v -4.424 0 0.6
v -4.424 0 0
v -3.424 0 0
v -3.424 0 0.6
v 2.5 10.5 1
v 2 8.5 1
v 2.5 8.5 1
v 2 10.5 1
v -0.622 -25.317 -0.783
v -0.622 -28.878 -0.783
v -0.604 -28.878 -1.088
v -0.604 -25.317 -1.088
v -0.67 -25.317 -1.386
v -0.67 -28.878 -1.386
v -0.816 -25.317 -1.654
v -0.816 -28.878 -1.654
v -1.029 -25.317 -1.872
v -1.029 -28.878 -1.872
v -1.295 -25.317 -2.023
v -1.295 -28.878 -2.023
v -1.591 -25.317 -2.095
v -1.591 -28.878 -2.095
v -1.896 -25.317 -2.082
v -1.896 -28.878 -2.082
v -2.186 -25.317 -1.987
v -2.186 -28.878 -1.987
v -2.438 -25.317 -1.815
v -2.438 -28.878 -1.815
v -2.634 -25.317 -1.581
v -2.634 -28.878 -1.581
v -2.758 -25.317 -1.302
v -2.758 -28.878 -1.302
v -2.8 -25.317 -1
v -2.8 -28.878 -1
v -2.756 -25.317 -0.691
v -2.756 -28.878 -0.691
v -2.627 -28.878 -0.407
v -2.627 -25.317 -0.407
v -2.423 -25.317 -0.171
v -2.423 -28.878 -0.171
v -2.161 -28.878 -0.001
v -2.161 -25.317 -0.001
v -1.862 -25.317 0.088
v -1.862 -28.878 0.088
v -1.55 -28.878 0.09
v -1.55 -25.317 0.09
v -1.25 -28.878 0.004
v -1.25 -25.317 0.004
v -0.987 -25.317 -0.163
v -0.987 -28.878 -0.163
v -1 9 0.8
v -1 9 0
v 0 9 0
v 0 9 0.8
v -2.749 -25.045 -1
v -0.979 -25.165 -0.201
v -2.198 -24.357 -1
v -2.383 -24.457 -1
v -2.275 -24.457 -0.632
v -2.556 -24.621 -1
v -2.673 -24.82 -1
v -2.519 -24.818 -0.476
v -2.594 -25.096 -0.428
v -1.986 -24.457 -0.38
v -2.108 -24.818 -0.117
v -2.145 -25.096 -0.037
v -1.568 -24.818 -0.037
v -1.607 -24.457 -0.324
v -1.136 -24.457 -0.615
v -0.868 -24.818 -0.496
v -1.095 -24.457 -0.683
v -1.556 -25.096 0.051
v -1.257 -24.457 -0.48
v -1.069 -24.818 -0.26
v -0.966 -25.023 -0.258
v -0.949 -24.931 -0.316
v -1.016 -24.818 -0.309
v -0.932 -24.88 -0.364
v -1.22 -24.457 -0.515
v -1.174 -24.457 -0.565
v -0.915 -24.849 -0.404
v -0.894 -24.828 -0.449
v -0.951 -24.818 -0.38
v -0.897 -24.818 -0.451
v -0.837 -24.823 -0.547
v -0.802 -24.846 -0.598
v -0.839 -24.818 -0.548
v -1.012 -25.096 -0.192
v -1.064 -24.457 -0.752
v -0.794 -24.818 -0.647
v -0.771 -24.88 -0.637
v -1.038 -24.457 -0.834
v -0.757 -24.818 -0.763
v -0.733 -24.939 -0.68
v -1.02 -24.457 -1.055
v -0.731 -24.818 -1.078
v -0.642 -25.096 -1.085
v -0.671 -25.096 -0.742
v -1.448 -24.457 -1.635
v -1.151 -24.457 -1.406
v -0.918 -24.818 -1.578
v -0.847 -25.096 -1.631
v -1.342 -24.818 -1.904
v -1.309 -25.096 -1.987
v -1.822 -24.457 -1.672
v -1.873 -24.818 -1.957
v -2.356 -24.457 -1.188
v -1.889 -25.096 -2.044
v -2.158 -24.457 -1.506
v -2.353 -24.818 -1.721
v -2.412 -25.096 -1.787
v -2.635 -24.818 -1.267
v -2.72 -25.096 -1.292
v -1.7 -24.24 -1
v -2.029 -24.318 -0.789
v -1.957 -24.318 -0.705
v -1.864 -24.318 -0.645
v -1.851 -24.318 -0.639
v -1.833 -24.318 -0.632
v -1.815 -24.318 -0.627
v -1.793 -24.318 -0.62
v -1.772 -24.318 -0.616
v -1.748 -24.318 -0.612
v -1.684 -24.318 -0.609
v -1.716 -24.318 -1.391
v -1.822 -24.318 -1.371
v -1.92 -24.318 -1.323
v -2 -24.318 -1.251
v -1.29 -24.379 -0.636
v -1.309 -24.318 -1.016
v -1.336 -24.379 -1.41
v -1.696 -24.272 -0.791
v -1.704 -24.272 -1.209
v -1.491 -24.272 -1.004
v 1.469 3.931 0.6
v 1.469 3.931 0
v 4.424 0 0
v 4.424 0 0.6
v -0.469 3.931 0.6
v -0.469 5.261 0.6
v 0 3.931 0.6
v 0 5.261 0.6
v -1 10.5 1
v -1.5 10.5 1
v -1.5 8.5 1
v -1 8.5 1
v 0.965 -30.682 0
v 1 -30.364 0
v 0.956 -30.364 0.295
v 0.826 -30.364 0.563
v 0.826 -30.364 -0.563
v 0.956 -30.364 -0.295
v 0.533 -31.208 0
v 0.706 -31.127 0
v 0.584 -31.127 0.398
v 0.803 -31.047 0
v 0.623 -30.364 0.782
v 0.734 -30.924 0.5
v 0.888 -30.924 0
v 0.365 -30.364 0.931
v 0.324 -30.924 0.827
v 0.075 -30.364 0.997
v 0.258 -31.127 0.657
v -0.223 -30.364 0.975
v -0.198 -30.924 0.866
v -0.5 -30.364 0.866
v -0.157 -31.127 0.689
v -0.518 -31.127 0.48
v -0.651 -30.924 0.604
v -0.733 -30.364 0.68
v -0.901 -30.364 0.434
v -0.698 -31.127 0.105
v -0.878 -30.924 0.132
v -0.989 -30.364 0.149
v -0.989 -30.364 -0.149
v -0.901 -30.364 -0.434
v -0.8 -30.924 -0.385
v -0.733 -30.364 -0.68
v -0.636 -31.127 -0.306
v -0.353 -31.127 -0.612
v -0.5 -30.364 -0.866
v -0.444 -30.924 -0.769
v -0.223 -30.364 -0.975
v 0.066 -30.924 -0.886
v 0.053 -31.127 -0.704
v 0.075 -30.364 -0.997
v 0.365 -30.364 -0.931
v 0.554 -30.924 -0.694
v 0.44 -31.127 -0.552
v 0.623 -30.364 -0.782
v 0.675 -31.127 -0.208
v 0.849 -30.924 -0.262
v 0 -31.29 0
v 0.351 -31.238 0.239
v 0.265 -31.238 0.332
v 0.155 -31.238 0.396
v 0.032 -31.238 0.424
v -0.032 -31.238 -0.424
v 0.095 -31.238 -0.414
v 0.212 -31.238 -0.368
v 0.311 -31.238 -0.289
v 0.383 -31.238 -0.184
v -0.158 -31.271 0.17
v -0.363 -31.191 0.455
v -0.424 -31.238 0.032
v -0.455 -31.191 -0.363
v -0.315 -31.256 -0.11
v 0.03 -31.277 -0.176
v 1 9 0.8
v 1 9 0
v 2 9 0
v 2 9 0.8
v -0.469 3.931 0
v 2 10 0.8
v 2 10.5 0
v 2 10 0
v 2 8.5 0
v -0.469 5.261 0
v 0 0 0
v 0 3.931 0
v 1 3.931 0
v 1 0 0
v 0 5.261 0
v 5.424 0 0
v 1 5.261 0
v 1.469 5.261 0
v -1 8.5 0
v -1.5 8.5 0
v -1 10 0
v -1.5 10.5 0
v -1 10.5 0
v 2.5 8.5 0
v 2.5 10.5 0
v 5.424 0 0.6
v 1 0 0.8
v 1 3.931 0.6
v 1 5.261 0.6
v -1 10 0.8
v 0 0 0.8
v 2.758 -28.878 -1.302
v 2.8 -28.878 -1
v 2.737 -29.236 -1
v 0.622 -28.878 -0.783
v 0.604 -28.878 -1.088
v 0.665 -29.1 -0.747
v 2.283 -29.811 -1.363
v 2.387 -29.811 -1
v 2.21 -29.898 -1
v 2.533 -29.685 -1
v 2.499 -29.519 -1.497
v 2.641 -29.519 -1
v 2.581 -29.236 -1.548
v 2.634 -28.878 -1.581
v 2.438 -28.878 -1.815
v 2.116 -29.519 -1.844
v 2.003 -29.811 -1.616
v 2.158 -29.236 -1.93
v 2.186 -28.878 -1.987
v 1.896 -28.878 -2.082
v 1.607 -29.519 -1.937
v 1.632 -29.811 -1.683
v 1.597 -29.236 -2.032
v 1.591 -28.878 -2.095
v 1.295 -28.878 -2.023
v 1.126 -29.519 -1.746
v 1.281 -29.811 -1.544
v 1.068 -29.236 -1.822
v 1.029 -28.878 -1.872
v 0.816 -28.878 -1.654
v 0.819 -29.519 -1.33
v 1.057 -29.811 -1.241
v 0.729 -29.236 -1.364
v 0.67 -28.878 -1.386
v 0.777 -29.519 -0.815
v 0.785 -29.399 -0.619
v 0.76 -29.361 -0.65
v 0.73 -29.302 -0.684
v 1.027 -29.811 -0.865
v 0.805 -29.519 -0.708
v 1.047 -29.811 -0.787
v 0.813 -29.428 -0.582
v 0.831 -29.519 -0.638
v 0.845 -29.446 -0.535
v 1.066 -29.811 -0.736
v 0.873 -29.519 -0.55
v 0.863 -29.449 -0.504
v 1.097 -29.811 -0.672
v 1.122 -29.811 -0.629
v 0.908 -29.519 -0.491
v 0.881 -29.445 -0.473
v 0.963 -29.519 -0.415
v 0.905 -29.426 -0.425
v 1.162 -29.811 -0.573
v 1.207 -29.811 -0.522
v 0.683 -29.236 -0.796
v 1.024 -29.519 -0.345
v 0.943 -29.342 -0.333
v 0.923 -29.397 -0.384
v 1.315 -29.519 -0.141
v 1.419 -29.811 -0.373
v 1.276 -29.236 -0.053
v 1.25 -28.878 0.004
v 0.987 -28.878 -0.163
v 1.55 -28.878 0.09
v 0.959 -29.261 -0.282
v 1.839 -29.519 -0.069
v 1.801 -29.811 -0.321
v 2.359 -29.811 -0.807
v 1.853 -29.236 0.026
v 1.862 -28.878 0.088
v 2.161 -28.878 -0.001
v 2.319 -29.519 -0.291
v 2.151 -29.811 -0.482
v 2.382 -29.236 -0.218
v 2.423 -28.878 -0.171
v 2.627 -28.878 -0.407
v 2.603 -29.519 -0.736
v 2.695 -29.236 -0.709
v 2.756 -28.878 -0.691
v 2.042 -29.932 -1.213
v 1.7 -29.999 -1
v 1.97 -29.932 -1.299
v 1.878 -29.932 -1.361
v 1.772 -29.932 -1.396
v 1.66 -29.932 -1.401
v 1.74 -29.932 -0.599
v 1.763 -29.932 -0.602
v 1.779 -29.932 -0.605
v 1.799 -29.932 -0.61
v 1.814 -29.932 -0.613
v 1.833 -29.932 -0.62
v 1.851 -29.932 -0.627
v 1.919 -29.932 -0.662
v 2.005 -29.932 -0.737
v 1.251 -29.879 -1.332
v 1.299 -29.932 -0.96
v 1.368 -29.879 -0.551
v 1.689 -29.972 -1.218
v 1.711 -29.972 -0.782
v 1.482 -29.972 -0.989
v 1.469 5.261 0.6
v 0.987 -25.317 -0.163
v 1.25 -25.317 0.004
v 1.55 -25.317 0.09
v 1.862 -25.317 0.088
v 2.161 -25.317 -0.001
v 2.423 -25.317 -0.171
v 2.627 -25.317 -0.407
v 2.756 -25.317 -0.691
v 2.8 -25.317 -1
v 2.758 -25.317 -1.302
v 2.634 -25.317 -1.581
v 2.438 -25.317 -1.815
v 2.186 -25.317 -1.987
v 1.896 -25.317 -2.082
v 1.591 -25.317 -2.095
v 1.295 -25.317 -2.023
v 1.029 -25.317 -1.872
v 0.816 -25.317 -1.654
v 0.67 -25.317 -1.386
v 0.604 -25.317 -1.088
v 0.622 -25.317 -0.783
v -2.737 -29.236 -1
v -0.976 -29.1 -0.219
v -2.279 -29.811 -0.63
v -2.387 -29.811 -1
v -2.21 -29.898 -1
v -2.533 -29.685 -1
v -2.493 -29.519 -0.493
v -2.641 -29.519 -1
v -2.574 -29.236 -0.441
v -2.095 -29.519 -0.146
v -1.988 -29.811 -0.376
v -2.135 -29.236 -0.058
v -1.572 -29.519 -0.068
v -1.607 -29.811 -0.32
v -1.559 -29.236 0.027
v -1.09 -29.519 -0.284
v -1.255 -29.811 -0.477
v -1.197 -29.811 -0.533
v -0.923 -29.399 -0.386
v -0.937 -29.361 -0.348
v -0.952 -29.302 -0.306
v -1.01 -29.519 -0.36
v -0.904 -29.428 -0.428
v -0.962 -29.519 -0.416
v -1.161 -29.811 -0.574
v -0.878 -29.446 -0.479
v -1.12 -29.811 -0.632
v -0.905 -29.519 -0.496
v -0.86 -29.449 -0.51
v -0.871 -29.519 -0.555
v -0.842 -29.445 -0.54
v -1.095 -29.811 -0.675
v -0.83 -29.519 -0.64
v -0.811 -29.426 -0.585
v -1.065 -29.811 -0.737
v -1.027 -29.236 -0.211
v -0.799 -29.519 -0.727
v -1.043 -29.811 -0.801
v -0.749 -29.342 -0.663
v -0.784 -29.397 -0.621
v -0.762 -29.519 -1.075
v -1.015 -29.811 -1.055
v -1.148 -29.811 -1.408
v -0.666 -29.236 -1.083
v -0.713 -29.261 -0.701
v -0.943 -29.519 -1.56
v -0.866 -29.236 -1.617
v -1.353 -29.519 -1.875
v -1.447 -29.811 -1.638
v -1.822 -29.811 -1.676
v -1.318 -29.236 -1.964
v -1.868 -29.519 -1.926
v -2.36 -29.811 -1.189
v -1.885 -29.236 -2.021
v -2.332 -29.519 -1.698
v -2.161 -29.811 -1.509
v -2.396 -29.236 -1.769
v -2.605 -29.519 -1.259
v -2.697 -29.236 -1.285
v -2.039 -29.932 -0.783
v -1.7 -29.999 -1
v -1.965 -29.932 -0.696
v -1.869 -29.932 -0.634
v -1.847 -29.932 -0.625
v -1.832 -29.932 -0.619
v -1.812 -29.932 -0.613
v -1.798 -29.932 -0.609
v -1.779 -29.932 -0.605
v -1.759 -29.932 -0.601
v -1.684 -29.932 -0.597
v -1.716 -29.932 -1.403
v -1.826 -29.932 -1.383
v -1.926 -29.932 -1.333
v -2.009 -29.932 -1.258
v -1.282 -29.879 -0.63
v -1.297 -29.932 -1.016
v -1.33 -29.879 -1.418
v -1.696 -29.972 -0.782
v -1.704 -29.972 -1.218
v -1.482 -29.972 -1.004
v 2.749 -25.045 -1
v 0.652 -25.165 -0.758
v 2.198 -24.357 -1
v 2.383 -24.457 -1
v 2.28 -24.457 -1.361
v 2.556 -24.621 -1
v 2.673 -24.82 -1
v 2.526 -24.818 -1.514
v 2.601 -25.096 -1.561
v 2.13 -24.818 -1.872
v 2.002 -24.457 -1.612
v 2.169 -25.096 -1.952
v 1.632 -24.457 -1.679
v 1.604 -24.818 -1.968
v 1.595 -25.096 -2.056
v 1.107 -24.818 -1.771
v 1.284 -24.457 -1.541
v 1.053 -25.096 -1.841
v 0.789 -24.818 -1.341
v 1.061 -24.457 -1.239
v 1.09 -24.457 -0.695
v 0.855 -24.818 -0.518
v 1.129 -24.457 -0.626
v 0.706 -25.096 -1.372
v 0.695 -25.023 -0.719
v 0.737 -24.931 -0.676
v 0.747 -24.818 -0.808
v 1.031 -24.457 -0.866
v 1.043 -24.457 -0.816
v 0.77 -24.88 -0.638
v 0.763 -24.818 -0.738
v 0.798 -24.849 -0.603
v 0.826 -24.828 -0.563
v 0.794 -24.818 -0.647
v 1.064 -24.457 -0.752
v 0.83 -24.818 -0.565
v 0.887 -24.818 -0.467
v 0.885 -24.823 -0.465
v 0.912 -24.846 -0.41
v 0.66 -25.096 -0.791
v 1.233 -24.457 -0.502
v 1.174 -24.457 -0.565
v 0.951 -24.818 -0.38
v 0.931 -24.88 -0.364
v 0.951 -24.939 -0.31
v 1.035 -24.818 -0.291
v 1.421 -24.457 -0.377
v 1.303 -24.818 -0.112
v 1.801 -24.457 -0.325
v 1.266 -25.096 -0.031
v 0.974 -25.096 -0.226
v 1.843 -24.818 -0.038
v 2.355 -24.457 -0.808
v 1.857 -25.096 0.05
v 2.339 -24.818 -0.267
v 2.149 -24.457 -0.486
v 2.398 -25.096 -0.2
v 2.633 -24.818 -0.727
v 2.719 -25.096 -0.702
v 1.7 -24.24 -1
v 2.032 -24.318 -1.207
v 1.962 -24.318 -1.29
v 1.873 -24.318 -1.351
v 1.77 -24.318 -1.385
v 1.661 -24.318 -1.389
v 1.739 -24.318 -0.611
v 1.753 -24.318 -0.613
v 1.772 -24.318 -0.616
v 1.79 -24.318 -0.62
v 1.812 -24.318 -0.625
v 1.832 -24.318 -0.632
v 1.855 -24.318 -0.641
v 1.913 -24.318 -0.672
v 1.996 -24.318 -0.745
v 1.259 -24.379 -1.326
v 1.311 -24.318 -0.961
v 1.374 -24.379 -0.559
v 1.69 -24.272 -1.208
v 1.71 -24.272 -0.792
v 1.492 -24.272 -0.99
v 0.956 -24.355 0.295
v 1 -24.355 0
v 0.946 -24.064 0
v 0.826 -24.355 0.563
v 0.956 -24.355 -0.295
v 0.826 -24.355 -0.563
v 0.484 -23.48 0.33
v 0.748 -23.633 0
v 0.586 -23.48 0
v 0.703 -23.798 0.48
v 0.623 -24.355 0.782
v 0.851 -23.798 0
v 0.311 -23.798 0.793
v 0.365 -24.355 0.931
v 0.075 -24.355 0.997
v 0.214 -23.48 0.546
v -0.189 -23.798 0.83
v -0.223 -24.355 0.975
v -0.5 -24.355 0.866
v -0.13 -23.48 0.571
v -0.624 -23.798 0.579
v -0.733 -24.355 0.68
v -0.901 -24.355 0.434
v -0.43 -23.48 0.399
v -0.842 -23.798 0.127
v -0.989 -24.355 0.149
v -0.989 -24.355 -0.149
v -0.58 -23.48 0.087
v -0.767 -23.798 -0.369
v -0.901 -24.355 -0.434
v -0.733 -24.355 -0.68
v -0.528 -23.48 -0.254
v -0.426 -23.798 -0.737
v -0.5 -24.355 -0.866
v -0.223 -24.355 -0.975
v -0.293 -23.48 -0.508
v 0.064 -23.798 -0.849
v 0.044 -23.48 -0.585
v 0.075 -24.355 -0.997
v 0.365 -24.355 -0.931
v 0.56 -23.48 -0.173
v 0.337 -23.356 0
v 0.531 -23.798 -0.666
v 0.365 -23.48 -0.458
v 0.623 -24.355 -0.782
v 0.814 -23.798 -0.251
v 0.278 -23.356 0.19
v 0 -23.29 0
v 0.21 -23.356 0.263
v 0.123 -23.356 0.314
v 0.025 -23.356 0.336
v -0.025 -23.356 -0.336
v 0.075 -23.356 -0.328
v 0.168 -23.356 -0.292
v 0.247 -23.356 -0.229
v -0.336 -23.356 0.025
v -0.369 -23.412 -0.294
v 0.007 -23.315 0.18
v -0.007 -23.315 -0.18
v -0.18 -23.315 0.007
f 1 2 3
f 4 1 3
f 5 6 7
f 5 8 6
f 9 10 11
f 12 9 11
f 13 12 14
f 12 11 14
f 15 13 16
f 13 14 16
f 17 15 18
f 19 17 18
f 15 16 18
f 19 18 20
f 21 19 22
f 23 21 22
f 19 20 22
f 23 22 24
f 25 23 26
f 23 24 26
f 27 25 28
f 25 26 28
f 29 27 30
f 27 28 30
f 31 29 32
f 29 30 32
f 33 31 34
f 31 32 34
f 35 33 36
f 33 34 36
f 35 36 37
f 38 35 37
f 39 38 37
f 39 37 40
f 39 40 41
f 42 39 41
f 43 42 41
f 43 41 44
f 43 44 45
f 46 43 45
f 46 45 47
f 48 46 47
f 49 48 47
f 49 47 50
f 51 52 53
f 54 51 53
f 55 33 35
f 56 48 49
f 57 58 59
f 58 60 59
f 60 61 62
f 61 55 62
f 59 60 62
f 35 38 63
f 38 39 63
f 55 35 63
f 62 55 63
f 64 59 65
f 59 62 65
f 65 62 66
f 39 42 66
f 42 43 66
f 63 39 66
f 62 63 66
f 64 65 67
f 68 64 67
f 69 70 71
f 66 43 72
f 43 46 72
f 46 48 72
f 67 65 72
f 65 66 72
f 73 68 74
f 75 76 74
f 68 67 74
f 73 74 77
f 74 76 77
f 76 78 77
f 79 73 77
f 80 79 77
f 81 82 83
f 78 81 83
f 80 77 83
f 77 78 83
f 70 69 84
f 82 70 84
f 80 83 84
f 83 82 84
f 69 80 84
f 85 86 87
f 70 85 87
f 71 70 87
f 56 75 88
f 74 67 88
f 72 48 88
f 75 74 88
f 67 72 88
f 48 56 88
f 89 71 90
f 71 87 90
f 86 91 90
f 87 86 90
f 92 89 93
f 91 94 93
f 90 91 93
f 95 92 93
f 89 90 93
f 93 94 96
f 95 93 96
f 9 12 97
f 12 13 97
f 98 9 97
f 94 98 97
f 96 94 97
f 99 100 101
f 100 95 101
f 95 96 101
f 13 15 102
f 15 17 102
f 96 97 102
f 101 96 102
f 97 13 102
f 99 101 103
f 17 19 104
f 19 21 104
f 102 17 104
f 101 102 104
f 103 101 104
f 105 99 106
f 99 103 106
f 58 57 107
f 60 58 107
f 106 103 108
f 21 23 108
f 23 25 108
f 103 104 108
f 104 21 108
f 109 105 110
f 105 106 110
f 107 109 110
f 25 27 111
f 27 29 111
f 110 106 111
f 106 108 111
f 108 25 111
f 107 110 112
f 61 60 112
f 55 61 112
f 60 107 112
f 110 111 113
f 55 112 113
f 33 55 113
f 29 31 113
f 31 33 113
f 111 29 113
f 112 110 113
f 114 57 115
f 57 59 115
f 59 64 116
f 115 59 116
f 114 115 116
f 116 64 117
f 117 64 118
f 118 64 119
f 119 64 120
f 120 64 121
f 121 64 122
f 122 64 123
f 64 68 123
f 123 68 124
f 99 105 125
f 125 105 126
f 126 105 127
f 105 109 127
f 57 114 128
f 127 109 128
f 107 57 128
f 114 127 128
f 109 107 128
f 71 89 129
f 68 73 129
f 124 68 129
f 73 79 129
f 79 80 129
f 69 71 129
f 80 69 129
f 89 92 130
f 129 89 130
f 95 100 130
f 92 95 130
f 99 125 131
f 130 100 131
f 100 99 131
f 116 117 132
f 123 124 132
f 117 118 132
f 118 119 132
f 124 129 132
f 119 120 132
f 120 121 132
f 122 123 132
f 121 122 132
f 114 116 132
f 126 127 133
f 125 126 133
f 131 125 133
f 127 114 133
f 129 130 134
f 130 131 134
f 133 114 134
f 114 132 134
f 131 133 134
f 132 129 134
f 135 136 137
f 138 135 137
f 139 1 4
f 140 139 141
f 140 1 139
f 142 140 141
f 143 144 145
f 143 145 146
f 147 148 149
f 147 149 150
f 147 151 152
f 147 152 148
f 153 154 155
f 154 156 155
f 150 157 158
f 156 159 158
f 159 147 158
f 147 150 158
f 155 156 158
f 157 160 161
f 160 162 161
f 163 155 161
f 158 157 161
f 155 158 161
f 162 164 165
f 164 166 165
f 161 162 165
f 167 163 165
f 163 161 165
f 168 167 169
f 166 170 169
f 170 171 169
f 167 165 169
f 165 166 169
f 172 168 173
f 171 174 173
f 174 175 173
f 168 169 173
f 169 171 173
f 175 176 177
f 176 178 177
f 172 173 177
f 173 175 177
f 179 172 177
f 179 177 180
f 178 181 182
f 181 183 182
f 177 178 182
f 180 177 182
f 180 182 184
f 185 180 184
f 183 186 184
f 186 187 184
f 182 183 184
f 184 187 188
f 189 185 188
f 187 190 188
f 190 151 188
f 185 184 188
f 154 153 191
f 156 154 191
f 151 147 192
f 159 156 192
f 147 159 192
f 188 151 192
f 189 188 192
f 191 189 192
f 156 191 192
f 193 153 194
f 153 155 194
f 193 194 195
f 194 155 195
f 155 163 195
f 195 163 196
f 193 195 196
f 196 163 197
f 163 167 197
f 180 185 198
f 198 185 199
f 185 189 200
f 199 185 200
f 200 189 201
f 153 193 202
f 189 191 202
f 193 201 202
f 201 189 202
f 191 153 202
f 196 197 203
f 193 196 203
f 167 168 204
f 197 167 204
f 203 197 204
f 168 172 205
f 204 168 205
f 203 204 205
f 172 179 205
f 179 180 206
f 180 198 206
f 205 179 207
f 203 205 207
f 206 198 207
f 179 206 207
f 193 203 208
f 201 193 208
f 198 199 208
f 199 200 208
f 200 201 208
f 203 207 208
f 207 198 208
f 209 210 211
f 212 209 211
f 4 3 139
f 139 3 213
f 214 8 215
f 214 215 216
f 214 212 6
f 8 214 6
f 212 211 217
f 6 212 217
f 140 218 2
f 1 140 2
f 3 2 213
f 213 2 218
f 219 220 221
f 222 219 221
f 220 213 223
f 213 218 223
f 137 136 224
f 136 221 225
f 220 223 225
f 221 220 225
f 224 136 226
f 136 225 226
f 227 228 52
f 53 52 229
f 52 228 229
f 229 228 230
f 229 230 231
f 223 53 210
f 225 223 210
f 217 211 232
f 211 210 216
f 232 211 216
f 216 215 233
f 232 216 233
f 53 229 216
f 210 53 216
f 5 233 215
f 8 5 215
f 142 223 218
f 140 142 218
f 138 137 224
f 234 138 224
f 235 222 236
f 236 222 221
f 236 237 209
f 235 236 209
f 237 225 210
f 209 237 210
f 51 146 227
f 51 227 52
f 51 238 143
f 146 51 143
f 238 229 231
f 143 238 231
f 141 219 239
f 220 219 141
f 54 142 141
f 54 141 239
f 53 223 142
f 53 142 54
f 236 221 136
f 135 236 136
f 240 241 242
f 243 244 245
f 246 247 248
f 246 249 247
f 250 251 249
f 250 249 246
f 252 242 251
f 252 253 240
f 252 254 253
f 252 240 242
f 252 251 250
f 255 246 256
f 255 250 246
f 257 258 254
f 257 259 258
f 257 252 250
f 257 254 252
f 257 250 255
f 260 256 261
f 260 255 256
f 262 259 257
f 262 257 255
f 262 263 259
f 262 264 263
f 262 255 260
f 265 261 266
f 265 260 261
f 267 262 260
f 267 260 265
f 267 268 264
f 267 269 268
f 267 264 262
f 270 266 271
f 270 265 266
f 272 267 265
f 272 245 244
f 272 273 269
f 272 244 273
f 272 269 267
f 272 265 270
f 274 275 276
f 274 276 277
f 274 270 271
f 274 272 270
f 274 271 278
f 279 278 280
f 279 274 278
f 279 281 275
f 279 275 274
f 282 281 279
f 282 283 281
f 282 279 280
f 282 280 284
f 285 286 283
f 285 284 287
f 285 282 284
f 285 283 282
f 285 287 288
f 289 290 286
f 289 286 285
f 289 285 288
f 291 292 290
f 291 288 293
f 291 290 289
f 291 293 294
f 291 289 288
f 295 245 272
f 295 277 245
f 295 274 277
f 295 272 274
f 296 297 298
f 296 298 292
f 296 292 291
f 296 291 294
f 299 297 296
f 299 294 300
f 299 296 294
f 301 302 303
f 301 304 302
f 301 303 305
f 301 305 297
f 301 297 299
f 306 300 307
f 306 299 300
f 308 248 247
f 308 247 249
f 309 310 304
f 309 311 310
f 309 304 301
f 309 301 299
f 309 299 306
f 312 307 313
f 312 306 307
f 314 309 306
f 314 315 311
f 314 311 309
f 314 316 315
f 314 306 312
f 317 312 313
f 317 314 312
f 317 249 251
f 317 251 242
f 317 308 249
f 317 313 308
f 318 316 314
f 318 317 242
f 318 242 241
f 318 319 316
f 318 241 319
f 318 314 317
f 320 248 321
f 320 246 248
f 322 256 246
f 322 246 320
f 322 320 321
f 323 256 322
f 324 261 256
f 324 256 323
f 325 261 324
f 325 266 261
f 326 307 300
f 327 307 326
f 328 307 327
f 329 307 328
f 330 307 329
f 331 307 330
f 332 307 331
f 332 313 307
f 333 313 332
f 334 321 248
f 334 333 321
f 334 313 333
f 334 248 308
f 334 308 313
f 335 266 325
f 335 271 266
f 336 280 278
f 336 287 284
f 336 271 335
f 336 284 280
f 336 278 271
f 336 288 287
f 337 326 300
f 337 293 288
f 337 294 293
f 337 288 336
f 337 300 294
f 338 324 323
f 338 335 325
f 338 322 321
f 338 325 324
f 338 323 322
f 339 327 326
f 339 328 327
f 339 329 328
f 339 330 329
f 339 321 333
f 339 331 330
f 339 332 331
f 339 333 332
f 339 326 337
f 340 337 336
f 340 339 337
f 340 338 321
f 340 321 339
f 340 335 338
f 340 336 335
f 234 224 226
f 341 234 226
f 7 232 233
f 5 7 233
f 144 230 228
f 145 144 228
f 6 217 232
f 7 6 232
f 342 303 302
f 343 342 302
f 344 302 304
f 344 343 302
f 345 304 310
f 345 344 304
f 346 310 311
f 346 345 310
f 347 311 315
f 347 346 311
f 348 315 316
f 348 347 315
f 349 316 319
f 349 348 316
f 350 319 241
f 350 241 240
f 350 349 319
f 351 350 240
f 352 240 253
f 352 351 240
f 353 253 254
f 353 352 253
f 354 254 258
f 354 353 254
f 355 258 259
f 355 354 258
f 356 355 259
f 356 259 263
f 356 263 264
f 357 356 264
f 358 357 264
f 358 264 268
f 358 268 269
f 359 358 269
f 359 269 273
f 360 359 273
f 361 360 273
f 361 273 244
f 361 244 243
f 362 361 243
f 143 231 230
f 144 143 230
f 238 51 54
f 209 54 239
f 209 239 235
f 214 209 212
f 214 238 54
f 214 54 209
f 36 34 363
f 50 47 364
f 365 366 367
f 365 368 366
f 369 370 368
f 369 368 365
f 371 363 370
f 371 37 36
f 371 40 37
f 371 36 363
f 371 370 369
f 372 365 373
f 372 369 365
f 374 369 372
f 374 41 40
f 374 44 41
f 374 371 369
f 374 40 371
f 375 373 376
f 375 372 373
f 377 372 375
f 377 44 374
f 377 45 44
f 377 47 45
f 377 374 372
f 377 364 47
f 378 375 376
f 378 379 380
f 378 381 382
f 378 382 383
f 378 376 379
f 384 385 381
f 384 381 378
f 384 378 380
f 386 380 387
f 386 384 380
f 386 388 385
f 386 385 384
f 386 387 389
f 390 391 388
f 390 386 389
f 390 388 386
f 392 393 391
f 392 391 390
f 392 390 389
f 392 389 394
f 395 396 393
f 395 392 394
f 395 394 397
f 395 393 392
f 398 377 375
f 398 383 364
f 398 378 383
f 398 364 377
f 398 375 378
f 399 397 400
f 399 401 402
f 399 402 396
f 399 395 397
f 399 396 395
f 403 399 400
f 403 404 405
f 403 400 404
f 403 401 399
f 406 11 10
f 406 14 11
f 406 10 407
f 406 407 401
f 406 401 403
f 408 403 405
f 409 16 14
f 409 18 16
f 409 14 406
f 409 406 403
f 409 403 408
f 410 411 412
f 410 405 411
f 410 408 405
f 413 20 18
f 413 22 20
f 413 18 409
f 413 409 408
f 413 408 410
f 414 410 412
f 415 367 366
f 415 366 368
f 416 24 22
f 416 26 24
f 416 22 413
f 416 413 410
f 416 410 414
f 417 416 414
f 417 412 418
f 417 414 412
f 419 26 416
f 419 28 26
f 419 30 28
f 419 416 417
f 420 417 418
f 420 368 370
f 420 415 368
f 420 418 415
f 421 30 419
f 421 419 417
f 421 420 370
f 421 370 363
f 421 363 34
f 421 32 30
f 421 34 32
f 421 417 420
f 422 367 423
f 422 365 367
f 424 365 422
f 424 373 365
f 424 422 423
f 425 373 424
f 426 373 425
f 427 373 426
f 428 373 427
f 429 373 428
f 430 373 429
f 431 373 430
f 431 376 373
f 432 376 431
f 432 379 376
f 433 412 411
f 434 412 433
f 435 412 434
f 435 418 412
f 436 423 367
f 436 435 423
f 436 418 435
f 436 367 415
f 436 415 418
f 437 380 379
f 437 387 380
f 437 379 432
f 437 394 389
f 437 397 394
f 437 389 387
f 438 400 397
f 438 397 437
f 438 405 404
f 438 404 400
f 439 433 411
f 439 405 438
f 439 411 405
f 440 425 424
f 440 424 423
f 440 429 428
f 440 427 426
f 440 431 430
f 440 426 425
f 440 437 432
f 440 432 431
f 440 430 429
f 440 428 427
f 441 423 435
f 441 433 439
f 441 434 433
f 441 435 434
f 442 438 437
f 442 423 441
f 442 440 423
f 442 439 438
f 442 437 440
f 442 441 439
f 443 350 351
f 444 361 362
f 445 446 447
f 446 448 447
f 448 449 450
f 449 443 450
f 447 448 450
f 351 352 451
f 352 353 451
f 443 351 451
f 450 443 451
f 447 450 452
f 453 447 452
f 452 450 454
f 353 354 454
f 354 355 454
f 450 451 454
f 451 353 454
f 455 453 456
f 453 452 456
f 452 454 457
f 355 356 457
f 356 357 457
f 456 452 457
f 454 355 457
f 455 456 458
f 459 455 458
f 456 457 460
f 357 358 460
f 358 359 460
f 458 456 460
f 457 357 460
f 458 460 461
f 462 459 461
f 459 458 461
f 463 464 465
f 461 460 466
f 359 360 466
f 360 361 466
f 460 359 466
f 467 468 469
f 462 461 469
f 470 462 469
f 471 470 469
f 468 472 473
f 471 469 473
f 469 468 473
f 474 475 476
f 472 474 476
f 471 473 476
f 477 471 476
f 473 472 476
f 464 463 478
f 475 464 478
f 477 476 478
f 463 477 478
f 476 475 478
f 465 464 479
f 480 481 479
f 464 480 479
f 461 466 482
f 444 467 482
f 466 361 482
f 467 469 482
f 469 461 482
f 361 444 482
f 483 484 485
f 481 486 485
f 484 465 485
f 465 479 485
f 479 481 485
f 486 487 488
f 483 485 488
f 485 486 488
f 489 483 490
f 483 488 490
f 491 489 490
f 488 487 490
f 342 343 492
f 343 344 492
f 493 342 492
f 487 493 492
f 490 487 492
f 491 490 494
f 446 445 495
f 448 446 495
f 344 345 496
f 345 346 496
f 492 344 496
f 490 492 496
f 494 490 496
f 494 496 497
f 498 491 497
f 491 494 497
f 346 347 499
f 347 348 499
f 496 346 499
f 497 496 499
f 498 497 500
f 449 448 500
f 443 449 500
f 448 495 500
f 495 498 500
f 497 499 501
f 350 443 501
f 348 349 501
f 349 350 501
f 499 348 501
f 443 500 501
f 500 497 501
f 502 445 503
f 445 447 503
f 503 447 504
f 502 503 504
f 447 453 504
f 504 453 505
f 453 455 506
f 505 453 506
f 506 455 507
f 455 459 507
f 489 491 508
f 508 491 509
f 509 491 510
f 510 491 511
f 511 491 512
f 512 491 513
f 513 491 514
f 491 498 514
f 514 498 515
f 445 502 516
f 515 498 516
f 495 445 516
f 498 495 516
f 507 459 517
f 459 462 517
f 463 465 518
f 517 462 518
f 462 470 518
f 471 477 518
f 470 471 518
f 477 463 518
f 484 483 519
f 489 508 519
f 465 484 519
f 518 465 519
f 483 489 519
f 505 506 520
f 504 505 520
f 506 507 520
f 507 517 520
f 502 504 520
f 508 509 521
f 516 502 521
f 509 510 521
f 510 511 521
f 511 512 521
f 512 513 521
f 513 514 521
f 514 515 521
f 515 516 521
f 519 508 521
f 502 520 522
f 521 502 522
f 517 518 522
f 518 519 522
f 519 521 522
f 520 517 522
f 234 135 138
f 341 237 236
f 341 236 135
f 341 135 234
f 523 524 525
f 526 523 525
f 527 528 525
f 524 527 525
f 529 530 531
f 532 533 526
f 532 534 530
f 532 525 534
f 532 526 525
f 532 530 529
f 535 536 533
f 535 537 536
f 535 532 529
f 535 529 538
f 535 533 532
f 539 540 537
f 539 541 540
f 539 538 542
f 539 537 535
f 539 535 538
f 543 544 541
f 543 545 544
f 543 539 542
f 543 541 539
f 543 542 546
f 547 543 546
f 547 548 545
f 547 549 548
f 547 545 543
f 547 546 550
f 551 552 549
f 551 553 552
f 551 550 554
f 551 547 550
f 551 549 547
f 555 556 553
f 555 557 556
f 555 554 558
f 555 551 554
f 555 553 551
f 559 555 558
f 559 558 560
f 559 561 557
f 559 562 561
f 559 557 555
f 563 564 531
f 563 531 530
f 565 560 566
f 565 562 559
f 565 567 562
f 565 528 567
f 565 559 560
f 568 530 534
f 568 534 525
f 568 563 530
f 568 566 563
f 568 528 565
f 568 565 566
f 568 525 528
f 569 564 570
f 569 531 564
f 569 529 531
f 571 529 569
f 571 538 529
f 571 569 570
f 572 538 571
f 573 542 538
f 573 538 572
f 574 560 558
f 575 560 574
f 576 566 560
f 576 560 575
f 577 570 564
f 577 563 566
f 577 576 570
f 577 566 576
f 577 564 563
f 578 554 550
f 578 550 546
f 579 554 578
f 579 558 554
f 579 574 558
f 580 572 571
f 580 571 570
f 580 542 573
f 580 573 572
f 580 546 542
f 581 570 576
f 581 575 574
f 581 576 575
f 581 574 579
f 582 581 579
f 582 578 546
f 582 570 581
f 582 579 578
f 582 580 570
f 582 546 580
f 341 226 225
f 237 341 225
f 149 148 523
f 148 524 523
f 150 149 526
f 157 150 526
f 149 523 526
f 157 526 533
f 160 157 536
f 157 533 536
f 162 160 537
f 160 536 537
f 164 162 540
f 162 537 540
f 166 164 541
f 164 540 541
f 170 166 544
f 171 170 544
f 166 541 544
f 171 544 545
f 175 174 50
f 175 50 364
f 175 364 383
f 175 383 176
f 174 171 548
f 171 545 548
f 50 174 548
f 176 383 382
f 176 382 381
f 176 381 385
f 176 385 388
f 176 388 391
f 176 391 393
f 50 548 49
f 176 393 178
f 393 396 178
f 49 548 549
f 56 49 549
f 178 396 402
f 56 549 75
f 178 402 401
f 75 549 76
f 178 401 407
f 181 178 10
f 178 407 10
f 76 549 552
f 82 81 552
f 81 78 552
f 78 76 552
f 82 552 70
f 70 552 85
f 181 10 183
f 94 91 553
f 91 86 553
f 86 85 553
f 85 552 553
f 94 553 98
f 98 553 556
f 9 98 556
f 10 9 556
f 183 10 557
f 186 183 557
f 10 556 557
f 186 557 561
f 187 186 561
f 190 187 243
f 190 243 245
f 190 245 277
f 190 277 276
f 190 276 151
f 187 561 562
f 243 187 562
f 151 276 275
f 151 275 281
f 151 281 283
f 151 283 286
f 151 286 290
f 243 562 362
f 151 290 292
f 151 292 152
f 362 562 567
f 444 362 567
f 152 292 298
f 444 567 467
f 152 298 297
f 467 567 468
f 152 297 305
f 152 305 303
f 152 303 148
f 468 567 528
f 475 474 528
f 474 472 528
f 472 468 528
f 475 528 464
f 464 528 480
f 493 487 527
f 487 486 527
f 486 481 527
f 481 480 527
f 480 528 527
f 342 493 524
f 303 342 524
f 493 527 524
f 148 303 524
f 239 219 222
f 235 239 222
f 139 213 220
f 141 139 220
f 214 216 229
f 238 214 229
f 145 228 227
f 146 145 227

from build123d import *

# Parameters (mm, degrees)
F0_W     = 1
F0_H     = 9
F0_H_2   = 1
F1_DEPTH = 0.8
F2_DEPTH = 1
F4_DEPTH = 0.6


with BuildPart() as f1:
    # F0 (on Top) → F1 (new body)
    with BuildSketch(Plane.XY):
        with Locations((0.5, 4.5)):
            Rectangle(F0_W, F0_H)
        with Locations((-0.5, 9.5)):
            Rectangle(F0_W, F0_H_2)
        with Locations((0.5, 9.5)):
            Rectangle(F0_W, F0_H_2)
        with Locations((1.5, 9.5)):
            Rectangle(F0_W, F0_H_2)
        Polygon((-1, 8.5), (-1, 9), (-1, 10), (-1, 10.5), (-1.5, 10.5), (-1.5, 8.5), align=None)
        Polygon((2, 10), (2, 9), (2, 8.5), (2.5, 8.5), (2.5, 10.5), (2, 10.5), align=None)
    extrude(amount=F1_DEPTH)

    # F0 (on Top) → F2 (join)
    with BuildSketch(Plane.XY):
        Polygon((2, 10), (2, 9), (2, 8.5), (2.5, 8.5), (2.5, 10.5), (2, 10.5), align=None)
        Polygon((-1, 8.5), (-1, 9), (-1, 10), (-1, 10.5), (-1.5, 10.5), (-1.5, 8.5), align=None)
    extrude(amount=F2_DEPTH)

    # F3 (on Top) → F4 (join)
    with BuildSketch(Plane.XY):
        Polygon((1.468523, 5.261297), (0.5, 5.261297), (-0.468523, 5.261297), (-4.423744, 0), (-3.423744, 0), (-0.468523, 3.931081), (0.5, 3.931081), (1.468523, 3.931081), (4.423744, 0), (5.423744, 0), align=None)
    extrude(amount=F4_DEPTH)


with BuildPart() as f6:
    # F5 (on Top) → F6 (revolve)
    with BuildSketch(Plane.XY):
        with BuildLine():
            add(Edge.make_bspline(
                [(0, -23.29011), (0.771088, -23.357442), (0.928936, -23.834245), (1, -24.355026)],
                knots=[0, 0, 0, 0, 1.460837, 1.460837, 1.460837, 1.460837], degree=3))
            Line((0, -23.29011), (0, -31.29011))
            add(Edge.make_bspline(
                [(0, -31.29011), (0.834806, -31.247087), (0.958809, -31.007612), (1, -30.364284)],
                knots=[0, 0, 0, 0, 1.362774, 1.362774, 1.362774, 1.362774], degree=3))
            Line((1, -30.364284), (1, -24.355026))
        make_face()
    revolve(axis=Axis((0, -27.29011, 0), (0, -1, 0)))

    # F8 (on offset) → F9 (revolve)
    with BuildSketch(Plane.XY.offset(-1)):
        with BuildLine():
            Line((1.7, -24.240119), (1.7, -29.998835))
            add(Edge.make_bspline(
                [(1.7, -29.998835), (2.560772, -29.92416), (2.700339, -29.602965), (2.8, -28.87789)],
                knots=[0, 0, 0, 0, 1.570515, 1.570515, 1.570515, 1.570515], degree=3))
            Line((2.8, -28.87789), (2.8, -25.316736))
            add(Edge.make_bspline(
                [(1.7, -24.240119), (2.432765, -24.324562), (2.705333, -24.611963), (2.8, -25.316736)],
                knots=[0, 0, 0, 0, 1.539189, 1.539189, 1.539189, 1.539189], degree=3))
        make_face()
    revolve(axis=Axis((1.7, -27.119477, -1), (0, 1, 0)))

    # F8 (on offset) → F10 (revolve)
    with BuildSketch(Plane.XY.offset(-1)):
        with BuildLine():
            add(Edge.make_bspline(
                [(-1.7, -29.998835), (-2.560772, -29.92416), (-2.700339, -29.602965), (-2.8, -28.87789)],
                knots=[0, 0, 0, 0, 1.570515, 1.570515, 1.570515, 1.570515], degree=3))
            Line((-1.7, -29.998835), (-1.7, -24.240119))
            add(Edge.make_bspline(
                [(-1.7, -24.240119), (-2.432765, -24.324562), (-2.705333, -24.611963), (-2.8, -25.316736)],
                knots=[0, 0, 0, 0, 1.539189, 1.539189, 1.539189, 1.539189], degree=3))
            Line((-2.8, -25.316736), (-2.8, -28.87789))
        make_face()
    revolve(axis=Axis((-1.7, -27.119477, -1), (0, 1, 0)))


solid = Compound([f1.part, f6.part])
